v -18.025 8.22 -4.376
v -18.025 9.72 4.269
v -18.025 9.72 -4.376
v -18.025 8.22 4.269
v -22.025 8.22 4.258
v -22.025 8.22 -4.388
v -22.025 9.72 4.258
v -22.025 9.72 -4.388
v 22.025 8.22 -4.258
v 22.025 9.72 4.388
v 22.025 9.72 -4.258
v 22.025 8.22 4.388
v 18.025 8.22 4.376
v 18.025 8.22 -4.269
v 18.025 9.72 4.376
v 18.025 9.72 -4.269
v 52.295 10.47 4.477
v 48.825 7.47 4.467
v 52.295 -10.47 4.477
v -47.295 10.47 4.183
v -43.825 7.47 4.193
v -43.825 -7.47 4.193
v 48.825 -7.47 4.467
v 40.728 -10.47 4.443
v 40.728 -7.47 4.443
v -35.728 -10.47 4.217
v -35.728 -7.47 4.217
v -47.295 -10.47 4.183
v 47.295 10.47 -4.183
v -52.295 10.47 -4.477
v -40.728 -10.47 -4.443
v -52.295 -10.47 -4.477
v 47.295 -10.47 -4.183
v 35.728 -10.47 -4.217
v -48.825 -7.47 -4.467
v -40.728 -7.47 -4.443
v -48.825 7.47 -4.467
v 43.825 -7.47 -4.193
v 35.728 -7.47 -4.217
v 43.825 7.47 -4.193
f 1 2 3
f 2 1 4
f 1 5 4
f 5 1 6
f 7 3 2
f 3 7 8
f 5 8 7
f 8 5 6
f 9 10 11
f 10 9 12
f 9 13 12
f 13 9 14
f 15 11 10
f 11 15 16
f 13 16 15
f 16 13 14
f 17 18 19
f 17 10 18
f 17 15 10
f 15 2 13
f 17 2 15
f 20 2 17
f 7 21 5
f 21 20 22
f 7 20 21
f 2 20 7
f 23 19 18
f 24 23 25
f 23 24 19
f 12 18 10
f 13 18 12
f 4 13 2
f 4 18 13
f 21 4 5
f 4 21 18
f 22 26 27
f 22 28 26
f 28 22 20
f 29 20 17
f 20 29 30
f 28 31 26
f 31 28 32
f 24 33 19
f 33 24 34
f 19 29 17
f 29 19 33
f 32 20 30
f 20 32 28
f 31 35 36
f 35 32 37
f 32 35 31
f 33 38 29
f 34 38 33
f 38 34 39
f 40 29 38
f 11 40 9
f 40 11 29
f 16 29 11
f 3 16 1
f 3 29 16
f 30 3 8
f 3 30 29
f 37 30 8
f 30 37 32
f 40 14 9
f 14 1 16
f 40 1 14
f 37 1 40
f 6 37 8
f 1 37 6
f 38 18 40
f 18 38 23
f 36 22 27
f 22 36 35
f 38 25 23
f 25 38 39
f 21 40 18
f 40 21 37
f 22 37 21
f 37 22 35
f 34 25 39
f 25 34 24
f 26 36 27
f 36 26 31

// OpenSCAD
width = 80.1; // hdd width
thickness = 14.94; // hdd thickness

height = 10;  
wall = 3;
cutout = 7;
angle = 30;

rotate([90,angle,0]) {
    difference() {
        linear_extrude(thickness+2*wall,center=true) {
            polygon([
                [-width/2-wall,-sin(angle)*width/2],
                [-width/2-wall,-sin(angle)*width/2-height],
                [width/2+wall,sin(angle)*width/2],
                [width/2+wall,sin(angle)*width/2+height] 
            ]);
        }
        cube([width,1000,thickness],center=true);
        translate ([0,0,thickness/2]) {
            cube([width-2*cutout,1000,thickness-2*wall],center=true);
        }
        rotate([0,0,angle]) { 
            translate ([-width/4,0,-thickness/2-wall/2]) {
                cube([4,1000,1.5],center=true);
            }
            translate ([width/4,0,-thickness/2-wall/2]) {
                cube([4,1000,1.5],center=true);
            }
        }
    }
}
